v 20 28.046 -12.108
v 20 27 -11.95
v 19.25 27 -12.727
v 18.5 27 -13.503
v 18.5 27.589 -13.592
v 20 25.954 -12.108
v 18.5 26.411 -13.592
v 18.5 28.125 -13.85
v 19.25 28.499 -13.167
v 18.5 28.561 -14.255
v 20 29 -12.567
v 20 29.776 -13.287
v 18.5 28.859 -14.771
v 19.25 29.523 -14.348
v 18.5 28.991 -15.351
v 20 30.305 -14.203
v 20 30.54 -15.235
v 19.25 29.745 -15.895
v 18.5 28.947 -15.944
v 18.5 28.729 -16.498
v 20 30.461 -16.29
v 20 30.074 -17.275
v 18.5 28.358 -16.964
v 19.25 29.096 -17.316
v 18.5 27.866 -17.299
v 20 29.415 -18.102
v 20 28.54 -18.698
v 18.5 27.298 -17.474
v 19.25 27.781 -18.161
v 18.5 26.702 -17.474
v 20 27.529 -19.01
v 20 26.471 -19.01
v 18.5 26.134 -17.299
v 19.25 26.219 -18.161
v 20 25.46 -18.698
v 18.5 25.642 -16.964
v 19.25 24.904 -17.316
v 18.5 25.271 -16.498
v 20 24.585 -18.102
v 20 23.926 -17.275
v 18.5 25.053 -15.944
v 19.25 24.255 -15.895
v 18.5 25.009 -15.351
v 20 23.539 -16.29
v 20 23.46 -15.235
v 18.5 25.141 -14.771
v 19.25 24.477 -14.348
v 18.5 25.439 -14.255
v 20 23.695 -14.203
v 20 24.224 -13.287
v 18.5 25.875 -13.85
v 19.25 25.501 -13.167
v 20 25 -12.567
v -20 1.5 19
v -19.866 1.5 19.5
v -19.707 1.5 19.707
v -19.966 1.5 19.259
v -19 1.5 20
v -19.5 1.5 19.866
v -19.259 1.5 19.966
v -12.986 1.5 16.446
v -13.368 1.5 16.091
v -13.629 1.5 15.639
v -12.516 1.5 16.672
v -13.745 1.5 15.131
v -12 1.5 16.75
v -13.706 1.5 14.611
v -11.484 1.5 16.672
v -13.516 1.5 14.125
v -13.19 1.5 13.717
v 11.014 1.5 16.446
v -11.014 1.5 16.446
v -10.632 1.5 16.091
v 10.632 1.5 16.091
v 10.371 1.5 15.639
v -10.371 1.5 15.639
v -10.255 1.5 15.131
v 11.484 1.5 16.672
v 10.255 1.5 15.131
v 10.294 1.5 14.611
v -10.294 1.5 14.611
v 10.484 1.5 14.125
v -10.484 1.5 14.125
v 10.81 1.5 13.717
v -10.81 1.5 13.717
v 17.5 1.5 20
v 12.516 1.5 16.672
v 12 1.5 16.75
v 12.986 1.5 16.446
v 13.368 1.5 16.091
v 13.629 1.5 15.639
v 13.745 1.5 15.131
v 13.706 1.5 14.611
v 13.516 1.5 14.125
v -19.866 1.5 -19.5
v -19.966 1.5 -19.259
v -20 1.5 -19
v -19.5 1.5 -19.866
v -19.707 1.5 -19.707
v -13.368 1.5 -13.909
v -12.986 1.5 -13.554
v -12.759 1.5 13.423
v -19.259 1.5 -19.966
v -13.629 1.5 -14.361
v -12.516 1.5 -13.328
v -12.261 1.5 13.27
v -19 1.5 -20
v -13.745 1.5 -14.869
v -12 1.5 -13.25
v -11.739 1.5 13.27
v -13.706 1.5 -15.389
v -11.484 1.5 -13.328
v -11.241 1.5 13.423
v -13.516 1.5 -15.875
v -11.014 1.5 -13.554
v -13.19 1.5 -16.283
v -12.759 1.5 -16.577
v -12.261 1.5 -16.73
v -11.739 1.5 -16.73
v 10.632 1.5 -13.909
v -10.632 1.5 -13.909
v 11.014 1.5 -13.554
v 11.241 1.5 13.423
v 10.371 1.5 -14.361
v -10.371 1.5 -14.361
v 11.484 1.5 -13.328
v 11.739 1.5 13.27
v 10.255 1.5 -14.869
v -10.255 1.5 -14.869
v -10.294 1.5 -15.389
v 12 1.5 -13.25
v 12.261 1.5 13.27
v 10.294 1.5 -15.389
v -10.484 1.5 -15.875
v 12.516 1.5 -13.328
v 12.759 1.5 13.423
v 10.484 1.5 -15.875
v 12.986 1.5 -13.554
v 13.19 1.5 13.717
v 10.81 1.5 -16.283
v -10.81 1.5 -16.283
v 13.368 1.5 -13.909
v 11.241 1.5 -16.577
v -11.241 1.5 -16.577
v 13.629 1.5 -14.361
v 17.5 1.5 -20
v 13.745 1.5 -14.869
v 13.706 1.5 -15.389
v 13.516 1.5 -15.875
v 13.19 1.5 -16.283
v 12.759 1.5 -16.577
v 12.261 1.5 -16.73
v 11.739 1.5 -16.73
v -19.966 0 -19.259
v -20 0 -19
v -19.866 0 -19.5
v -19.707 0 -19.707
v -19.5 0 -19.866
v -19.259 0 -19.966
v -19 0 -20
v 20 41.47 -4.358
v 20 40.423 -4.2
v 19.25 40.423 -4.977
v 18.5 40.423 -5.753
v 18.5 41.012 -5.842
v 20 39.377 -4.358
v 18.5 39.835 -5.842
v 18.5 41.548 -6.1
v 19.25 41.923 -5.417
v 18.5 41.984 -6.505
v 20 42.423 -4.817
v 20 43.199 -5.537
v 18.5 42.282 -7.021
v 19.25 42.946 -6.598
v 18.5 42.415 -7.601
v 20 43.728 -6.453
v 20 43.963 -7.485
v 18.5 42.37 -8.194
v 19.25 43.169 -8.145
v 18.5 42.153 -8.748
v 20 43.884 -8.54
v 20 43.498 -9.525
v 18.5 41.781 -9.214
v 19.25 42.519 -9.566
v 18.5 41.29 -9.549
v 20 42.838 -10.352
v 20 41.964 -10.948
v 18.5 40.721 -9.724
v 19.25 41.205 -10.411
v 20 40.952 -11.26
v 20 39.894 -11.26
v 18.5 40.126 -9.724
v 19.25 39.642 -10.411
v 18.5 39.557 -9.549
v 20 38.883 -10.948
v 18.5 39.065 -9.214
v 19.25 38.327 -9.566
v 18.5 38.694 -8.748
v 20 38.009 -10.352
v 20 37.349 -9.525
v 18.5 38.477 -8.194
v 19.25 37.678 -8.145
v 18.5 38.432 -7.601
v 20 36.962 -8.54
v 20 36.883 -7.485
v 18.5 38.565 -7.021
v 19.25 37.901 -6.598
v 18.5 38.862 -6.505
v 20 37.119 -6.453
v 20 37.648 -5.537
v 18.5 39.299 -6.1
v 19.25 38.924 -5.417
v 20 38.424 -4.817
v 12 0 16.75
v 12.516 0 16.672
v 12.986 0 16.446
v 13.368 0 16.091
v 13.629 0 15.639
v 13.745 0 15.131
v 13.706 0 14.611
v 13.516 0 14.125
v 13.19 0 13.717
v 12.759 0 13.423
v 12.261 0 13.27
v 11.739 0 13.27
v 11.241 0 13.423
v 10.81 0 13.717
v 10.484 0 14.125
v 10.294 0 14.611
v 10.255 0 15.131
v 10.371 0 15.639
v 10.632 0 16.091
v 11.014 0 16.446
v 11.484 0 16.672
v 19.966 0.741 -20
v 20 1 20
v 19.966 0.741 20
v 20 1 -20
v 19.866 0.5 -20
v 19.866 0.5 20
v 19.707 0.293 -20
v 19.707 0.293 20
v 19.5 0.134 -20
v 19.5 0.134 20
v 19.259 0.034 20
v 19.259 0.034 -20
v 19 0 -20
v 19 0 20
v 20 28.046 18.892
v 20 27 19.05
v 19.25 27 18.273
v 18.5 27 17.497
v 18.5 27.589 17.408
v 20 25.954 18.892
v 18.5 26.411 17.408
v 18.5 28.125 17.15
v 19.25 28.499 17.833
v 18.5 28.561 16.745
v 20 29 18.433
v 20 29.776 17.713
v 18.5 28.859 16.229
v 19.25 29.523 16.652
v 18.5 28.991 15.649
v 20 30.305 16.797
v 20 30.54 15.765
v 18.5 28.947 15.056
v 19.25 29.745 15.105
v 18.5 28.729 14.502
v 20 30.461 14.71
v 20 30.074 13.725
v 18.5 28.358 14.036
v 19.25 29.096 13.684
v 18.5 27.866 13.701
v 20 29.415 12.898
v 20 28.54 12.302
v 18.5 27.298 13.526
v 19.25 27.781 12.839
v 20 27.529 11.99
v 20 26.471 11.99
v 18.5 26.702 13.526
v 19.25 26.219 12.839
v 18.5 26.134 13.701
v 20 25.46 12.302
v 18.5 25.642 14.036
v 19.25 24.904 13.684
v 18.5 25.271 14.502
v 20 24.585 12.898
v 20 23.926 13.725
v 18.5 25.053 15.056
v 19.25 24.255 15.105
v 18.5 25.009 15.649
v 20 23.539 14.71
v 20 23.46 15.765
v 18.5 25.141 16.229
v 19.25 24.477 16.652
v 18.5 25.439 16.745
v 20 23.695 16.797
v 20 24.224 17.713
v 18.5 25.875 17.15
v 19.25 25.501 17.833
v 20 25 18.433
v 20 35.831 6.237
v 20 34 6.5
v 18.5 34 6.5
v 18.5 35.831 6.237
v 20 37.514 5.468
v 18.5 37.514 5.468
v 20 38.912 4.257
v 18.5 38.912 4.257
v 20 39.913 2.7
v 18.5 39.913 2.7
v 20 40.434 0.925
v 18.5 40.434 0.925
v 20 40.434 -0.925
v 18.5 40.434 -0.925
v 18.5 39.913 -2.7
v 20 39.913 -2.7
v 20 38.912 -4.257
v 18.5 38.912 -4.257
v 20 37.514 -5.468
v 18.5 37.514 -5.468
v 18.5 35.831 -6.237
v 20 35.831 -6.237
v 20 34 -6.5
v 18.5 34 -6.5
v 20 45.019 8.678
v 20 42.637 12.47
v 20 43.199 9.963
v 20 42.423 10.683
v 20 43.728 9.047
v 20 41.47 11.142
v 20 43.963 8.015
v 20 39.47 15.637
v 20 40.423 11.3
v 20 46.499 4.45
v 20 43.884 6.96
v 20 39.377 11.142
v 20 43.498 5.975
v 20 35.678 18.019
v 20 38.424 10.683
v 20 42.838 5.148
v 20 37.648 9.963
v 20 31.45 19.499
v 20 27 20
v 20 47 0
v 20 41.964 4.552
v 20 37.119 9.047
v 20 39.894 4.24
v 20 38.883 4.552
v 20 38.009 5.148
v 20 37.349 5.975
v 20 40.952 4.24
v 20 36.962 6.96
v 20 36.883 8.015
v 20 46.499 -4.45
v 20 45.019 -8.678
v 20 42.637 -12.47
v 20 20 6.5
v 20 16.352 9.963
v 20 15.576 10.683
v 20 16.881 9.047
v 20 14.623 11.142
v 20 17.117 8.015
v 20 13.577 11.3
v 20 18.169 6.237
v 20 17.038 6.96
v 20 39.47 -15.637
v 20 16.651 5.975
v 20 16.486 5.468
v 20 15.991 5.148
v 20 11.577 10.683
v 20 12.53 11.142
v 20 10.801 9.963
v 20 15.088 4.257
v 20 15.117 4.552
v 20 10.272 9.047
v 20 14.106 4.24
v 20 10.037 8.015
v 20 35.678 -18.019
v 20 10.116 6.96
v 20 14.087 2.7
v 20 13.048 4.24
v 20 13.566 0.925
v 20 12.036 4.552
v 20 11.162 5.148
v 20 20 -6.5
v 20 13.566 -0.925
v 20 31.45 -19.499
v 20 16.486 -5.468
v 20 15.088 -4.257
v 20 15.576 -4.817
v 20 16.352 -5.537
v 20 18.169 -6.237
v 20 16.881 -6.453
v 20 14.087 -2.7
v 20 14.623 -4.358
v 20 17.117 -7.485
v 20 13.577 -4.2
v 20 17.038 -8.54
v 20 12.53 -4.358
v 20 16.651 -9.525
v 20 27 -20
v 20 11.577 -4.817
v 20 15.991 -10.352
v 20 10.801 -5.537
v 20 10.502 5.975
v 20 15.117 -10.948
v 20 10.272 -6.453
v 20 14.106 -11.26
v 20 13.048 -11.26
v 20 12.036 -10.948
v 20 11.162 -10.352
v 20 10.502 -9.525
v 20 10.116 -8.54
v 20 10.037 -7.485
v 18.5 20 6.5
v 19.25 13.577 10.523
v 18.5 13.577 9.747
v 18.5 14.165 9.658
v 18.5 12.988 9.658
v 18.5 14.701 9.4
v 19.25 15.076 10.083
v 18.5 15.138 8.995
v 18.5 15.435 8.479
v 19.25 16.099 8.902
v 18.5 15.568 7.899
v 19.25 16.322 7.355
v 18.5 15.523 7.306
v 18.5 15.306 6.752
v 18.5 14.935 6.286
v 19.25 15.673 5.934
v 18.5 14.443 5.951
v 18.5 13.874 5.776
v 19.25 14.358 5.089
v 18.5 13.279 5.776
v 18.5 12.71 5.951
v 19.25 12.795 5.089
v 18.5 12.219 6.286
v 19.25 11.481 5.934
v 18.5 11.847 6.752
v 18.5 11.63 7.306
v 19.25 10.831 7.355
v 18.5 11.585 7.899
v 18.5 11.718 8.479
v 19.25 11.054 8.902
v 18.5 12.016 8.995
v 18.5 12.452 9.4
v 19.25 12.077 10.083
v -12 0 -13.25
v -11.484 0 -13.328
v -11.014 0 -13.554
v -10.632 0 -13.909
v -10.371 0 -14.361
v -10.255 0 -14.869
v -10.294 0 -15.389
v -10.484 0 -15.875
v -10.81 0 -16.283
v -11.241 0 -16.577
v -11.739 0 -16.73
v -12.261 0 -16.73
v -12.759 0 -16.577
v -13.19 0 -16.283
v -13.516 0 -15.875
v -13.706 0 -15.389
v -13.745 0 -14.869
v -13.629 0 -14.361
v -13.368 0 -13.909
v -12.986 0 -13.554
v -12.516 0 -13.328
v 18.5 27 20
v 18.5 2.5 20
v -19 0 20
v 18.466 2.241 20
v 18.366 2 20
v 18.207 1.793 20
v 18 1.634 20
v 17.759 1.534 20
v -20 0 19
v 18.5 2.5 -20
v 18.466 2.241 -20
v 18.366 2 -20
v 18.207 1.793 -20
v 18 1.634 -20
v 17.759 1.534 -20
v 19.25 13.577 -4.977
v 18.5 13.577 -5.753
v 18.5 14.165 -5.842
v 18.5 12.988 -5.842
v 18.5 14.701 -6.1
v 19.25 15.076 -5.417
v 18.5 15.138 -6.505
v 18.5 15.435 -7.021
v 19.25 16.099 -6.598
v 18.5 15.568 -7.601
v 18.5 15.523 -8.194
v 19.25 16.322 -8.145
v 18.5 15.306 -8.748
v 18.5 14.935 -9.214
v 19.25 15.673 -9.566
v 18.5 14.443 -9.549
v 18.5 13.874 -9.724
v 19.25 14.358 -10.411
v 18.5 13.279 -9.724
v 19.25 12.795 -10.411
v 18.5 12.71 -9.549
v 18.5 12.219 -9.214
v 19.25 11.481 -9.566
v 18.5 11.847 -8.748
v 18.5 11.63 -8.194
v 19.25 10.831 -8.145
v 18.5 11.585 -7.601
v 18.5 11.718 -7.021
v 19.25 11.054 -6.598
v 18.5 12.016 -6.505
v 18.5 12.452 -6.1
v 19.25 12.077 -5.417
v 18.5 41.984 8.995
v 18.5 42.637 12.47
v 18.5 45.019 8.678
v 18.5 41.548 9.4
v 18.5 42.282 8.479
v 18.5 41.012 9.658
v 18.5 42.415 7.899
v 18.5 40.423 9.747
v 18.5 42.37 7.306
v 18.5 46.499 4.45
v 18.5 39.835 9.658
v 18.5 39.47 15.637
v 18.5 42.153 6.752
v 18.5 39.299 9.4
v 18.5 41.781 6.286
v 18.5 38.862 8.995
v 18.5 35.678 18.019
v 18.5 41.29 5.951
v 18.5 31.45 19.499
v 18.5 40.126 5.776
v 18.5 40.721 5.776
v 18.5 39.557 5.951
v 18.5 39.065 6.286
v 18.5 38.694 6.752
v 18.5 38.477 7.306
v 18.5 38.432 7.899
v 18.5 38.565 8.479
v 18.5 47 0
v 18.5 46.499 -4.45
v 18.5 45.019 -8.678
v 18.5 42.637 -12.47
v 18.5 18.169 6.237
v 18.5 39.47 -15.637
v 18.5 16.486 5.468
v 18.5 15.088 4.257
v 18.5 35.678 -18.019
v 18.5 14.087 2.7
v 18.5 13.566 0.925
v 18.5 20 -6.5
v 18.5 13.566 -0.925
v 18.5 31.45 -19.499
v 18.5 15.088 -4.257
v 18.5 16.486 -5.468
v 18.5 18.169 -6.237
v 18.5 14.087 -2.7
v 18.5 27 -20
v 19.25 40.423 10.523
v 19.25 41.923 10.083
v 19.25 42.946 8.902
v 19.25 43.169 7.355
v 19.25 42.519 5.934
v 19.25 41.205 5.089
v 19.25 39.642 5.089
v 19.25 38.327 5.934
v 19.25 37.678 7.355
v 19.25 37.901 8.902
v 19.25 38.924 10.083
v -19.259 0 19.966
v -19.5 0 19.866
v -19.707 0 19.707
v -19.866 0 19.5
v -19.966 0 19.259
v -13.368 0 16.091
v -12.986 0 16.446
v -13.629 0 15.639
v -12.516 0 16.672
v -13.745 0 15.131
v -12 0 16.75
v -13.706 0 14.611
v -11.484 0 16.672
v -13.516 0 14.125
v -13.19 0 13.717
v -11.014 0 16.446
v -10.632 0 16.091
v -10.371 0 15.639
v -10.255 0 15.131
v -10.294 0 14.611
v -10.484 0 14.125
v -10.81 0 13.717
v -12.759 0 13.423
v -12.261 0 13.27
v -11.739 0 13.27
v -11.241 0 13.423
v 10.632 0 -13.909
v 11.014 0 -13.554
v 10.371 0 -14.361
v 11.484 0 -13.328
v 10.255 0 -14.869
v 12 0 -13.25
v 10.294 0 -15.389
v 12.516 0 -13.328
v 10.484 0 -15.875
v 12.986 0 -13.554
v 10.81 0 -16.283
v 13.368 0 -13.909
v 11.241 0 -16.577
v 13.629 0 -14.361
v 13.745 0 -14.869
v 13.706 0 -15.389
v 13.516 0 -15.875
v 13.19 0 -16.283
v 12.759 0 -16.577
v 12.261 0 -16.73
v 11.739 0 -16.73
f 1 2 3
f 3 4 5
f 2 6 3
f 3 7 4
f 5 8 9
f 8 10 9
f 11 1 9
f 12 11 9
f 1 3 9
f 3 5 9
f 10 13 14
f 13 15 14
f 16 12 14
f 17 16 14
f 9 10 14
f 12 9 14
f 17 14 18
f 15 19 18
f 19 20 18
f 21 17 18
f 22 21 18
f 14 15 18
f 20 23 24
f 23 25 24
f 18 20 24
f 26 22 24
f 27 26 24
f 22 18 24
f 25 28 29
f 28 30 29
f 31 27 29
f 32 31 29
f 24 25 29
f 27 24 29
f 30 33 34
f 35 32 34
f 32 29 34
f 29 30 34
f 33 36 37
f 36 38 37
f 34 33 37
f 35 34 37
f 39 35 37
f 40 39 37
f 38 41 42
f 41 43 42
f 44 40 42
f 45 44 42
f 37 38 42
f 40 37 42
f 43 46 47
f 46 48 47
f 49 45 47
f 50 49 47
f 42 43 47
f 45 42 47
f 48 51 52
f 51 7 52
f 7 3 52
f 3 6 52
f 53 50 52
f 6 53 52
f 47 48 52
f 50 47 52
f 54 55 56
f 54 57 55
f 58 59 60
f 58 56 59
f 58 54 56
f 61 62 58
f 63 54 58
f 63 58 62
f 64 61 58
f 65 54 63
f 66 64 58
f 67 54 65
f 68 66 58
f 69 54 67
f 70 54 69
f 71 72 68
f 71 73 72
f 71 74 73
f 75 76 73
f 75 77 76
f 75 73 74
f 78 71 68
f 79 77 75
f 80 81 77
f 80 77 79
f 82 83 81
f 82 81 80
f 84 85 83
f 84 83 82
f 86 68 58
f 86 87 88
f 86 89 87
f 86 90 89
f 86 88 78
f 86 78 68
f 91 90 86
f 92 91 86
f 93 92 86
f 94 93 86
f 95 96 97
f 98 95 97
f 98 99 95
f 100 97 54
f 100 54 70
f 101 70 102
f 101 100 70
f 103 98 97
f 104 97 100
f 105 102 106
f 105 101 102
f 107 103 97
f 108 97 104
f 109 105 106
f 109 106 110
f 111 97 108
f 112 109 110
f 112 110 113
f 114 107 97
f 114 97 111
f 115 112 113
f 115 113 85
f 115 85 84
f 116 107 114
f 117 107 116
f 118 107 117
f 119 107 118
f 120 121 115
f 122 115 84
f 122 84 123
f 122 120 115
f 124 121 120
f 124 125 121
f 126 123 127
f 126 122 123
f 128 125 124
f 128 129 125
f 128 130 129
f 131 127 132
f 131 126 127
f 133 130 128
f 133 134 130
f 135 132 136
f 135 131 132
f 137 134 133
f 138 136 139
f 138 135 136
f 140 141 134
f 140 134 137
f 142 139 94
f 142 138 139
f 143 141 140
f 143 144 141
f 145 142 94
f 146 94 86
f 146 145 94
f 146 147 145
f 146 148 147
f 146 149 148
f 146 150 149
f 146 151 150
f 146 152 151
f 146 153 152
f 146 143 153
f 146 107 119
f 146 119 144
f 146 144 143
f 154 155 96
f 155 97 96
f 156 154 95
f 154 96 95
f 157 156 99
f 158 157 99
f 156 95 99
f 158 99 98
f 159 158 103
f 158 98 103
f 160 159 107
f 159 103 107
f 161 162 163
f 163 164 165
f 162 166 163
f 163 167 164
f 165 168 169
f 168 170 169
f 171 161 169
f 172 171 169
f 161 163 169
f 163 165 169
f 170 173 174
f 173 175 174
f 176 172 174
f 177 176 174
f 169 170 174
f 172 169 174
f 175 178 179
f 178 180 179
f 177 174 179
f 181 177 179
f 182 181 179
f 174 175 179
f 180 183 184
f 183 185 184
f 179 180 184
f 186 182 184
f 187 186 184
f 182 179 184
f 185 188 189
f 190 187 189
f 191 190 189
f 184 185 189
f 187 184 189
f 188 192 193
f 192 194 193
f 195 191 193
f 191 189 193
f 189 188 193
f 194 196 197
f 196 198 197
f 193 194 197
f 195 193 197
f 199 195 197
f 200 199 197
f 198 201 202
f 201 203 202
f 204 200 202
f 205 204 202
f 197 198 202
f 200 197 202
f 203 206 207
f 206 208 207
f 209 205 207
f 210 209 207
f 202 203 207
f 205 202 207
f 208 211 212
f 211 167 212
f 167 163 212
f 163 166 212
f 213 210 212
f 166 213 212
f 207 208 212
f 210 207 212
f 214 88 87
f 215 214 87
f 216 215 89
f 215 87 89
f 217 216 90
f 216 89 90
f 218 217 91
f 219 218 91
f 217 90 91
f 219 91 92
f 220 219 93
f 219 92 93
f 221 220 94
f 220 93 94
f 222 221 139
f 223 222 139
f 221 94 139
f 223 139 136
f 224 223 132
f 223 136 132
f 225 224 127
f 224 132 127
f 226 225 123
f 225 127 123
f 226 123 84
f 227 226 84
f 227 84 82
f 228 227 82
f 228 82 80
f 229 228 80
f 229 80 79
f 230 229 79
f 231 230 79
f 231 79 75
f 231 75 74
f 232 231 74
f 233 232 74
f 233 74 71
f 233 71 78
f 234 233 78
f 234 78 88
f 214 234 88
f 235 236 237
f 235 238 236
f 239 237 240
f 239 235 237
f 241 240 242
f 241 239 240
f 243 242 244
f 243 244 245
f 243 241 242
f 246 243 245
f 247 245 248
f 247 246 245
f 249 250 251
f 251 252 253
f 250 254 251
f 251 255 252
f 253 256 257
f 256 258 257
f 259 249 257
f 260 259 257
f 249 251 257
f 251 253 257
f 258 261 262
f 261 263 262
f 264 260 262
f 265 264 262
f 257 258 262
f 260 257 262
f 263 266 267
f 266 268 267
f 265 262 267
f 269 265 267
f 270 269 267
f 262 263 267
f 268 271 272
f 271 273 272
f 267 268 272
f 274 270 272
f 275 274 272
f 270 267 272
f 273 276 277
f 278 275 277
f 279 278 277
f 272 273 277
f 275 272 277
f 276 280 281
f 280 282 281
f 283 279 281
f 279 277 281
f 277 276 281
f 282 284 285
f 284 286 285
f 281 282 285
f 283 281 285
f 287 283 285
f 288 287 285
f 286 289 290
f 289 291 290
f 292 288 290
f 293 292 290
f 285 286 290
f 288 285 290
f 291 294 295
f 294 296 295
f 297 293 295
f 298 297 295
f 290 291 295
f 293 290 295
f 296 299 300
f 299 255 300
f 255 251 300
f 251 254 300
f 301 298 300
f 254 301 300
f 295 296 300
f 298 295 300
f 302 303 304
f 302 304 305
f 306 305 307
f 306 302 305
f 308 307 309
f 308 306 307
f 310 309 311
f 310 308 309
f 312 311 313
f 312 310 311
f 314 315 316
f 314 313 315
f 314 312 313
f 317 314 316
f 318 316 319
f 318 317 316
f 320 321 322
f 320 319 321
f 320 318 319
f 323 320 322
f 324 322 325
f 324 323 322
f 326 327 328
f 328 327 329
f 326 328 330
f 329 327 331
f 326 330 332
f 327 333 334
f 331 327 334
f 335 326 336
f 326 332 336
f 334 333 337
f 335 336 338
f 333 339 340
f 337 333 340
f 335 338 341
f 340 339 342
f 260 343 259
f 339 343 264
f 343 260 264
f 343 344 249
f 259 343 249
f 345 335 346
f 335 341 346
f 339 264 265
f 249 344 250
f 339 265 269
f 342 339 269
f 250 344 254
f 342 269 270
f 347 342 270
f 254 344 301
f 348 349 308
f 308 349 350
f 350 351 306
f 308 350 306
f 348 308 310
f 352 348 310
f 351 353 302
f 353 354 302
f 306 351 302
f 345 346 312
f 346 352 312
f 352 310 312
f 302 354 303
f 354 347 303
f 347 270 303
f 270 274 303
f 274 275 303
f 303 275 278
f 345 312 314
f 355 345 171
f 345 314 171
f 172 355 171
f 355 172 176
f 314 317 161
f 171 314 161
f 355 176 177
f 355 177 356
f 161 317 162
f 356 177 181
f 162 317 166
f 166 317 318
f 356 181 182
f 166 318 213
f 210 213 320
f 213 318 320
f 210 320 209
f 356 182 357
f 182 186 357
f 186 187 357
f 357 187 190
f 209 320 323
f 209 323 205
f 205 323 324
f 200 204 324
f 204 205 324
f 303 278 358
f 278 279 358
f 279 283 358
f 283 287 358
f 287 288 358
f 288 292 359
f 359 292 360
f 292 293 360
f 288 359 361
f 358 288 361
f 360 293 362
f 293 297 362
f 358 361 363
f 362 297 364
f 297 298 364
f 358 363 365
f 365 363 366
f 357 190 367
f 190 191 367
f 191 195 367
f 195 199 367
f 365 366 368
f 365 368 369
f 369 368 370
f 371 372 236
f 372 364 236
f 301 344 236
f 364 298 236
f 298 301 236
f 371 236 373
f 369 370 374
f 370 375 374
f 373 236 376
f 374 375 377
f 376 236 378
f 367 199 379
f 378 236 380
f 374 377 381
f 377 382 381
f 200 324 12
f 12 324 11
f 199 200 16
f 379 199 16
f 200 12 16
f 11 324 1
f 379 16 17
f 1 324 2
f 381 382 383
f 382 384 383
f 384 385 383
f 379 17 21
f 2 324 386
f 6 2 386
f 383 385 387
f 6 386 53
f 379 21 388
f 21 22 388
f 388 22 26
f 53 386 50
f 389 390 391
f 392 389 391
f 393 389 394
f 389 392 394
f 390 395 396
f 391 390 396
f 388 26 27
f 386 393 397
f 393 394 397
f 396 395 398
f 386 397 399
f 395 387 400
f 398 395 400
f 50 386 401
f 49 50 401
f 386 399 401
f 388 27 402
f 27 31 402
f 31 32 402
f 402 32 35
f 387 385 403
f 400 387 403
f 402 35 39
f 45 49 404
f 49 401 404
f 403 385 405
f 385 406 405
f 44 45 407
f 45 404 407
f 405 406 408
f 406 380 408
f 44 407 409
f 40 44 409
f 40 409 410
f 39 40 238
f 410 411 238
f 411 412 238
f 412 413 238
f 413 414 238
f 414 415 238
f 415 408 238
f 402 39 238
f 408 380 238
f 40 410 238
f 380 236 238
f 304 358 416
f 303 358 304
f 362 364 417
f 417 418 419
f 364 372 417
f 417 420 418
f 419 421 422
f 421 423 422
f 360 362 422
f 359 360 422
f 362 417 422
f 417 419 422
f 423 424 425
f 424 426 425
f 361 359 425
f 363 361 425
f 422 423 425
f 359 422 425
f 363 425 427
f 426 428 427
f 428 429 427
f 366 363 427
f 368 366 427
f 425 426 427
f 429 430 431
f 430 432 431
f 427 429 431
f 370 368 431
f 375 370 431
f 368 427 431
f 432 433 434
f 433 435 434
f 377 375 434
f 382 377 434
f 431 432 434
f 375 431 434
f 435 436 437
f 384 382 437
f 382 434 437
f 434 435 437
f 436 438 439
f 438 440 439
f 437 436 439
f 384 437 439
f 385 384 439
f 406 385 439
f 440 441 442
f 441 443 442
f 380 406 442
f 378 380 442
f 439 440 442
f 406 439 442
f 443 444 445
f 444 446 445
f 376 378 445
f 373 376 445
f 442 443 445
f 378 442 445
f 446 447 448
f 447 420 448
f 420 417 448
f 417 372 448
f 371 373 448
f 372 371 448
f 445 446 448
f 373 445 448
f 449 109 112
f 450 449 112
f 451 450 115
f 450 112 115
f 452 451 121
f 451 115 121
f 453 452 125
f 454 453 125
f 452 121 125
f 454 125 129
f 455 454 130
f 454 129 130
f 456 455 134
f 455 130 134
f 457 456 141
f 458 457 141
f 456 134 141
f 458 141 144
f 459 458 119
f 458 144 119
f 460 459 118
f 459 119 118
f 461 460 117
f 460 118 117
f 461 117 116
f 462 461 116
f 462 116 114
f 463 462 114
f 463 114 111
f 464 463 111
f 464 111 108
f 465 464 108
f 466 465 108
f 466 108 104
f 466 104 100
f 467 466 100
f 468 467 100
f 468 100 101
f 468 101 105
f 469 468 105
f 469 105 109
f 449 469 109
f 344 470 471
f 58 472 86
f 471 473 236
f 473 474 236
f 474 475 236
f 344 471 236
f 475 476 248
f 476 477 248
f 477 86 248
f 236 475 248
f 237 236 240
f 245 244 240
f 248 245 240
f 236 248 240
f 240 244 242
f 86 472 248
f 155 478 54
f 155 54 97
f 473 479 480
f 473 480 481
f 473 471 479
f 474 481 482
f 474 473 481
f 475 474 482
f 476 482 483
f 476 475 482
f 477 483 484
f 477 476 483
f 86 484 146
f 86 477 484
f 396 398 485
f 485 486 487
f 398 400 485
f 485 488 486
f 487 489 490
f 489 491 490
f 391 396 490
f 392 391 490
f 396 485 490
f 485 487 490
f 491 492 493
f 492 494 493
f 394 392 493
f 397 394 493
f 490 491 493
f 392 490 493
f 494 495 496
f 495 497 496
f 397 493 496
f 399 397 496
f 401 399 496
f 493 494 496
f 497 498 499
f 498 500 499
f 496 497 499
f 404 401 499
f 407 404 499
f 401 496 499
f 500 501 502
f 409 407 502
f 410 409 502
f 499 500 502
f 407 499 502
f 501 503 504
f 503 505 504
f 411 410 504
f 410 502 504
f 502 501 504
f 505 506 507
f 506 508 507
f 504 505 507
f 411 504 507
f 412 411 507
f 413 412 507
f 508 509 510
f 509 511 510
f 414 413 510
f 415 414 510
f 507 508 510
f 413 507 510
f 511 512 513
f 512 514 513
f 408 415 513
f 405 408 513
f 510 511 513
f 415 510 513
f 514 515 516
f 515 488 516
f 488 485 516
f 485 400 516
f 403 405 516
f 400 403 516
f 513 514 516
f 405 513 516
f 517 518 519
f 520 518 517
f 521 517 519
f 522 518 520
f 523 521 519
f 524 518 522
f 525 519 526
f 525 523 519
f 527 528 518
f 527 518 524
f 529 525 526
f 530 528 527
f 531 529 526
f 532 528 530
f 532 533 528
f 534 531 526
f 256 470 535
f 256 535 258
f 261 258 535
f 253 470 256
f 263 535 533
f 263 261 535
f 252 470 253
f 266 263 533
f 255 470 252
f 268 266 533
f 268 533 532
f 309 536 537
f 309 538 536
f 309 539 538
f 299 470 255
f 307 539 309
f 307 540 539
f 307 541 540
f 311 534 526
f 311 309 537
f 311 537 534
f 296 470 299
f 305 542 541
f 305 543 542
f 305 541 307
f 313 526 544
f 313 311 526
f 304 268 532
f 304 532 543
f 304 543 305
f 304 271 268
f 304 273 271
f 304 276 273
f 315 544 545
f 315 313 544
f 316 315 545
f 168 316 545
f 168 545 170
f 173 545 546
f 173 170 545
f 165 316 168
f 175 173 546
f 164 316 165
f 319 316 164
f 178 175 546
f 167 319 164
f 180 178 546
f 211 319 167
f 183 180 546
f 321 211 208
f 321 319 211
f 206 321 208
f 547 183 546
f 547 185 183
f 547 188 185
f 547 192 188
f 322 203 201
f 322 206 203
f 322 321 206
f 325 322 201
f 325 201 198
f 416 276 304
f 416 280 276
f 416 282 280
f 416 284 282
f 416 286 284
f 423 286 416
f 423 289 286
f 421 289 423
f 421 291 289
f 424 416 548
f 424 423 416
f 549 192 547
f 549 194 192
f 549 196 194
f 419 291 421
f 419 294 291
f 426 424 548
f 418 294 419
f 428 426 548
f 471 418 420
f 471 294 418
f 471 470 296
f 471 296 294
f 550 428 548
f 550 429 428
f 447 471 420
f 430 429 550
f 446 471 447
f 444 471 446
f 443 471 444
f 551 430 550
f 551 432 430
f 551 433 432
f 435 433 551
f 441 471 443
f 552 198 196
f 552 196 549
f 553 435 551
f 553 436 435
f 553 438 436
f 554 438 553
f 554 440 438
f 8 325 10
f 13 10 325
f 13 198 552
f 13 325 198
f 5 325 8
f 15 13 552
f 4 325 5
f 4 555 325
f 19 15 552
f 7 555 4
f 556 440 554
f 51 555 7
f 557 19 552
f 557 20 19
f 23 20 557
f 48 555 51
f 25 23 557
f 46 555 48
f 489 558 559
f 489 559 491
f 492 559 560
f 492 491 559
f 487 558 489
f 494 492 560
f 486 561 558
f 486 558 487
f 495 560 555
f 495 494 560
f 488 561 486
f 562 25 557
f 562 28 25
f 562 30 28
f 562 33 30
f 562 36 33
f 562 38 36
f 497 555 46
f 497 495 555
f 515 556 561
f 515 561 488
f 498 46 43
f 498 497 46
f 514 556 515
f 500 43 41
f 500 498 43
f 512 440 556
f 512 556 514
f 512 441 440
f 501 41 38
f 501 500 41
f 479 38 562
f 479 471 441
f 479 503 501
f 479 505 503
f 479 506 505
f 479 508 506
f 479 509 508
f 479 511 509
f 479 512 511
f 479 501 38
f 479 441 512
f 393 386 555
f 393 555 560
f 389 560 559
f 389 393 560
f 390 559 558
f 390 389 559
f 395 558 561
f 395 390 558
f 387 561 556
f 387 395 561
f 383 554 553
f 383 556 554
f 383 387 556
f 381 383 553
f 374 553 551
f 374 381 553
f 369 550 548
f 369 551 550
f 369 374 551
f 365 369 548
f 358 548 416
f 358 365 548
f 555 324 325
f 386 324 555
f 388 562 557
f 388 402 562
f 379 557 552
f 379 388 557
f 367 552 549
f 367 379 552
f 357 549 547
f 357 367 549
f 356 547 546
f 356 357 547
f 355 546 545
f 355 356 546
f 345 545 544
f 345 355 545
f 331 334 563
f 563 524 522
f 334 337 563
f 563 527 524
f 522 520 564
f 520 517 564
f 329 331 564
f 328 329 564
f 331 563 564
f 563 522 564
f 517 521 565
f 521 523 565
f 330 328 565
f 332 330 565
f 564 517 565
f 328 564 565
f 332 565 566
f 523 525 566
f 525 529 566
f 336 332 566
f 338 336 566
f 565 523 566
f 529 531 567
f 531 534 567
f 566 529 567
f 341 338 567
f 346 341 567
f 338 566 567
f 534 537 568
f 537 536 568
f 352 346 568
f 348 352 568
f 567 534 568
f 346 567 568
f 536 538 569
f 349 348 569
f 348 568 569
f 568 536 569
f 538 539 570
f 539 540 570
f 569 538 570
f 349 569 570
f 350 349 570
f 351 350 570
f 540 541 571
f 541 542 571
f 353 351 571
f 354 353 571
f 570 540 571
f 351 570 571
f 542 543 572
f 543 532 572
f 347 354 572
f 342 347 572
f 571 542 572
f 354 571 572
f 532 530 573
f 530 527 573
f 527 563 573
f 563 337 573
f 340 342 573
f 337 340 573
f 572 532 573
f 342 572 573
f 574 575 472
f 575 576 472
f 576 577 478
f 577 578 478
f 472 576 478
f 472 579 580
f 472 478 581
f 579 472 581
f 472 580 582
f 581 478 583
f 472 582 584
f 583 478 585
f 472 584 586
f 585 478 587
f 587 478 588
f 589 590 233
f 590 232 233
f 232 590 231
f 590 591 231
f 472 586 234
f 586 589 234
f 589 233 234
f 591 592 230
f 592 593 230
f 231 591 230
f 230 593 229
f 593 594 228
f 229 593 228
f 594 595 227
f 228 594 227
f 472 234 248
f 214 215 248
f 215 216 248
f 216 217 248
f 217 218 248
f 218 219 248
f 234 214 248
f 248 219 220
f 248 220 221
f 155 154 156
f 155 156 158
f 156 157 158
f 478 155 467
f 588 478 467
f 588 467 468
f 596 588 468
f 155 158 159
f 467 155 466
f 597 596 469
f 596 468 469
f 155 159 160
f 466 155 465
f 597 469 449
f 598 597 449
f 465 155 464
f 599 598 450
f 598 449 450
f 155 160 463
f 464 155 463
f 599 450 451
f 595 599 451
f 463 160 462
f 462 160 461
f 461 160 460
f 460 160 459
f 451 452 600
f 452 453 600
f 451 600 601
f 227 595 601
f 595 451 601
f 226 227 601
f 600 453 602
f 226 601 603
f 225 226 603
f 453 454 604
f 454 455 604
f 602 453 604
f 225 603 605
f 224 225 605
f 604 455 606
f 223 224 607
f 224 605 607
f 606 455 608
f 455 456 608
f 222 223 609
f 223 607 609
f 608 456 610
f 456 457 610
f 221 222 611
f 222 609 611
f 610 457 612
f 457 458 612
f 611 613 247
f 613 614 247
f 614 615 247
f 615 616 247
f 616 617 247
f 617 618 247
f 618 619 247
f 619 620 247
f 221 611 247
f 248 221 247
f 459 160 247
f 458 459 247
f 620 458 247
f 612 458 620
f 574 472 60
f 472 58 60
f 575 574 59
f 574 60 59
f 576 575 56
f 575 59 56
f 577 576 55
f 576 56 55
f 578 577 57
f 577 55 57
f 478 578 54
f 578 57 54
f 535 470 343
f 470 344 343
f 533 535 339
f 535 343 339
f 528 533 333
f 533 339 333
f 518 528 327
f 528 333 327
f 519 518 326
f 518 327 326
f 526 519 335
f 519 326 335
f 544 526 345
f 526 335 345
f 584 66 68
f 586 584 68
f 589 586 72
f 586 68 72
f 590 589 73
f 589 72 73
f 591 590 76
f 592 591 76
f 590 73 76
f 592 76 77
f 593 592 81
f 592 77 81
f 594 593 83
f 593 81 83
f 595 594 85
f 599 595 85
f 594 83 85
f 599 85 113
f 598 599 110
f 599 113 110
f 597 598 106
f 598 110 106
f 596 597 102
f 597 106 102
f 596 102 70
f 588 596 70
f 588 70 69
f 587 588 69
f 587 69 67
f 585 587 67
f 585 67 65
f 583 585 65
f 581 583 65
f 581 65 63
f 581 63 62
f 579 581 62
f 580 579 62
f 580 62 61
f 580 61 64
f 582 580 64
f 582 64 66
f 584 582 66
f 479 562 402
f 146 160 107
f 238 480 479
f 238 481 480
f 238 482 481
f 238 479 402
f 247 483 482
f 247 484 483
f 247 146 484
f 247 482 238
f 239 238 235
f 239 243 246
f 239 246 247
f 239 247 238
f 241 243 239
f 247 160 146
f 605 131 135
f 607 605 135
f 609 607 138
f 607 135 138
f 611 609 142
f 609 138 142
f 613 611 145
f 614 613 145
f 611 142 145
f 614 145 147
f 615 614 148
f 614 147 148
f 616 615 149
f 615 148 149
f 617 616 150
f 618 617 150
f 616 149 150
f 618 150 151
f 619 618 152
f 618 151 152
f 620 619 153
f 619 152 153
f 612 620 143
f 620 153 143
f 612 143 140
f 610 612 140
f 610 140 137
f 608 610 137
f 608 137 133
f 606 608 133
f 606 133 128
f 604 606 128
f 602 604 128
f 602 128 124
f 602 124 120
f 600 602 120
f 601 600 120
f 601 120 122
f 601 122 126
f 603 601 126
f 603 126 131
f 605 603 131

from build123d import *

# Parameters (mm, degrees)
SKETCH_1_W                   = 40
SKETCH_1_H                   = 40
EXTRUDE_1_DEPTH              = 1.5
SKETCH_2_R                   = 1.75
CUT_EXTRUDE_1_DEPTH          = 29.324018077
EXTRUDE_START                = -1.5
SKETCH_3_W                   = 1.5
SKETCH_3_H                   = 40
EXTRUDE_2_DEPTH              = 47
SKETCH_4_R                   = 1.5
CUT_EXTRUDE_2_DEPTH          = 65.876806333
HOLE_WIZARD_M3_1_D           = 3.4
HOLE_WIZARD_M3_1_DEPTH       = 15
HOLE_WIZARD_M3_1_CSINK_D     = 7.1
HOLE_WIZARD_M3_1_CSINK_ANGLE = 92
HOLE_WIZARD_M3_1_TIP         = 1.021463052
FILLET_1_R                   = 20
FILLET_2_R                   = 1


with BuildPart() as part:
    # 스케치1 → 보스-돌출1 (new body)
    with BuildSketch(Plane(origin=(0, 0, 0), x_dir=(1, 0, 0), z_dir=(0, 1, 0))):
        Rectangle(SKETCH_1_W, SKETCH_1_H)
    extrude(amount=EXTRUDE_1_DEPTH)

    # 스케치2 → 컷-돌출1 (cut, through all)
    with BuildSketch(Plane(origin=(0, 1.5, 0), x_dir=(1, 0, 0), z_dir=(0, 1, 0))):
        with Locations(Location((-12, 15, 0), (0, 0, 270))):
            Circle(SKETCH_2_R)
        with Locations(Location((12, 15, 0), (0, 0, 270))):
            Circle(SKETCH_2_R)
        with Locations(Location((-12, -15, 0), (0, 0, 270))):
            Circle(SKETCH_2_R)
        with Locations(Location((12, -15, 0), (0, 0, 270))):
            Circle(SKETCH_2_R)
    extrude(amount=-CUT_EXTRUDE_1_DEPTH, mode=Mode.SUBTRACT)

    # 스케치3 → 보스-돌출2 (add)
    with BuildSketch(Plane(origin=(0, 1.5, 0), x_dir=(1, 0, 0), z_dir=(0, 1, 0)).offset(EXTRUDE_START)):
        with Locations((19.25, 0)):
            Rectangle(SKETCH_3_W, SKETCH_3_H)
    extrude(amount=EXTRUDE_2_DEPTH)

    # 스케치4 → 컷-돌출2 (cut, through all)
    with BuildSketch(Plane(origin=(20, 0, 0), x_dir=(0, 0, -1), z_dir=(1, 0, 0))):
        with Locations((15.5, 27)):
            Circle(SKETCH_4_R)
        with Locations((7.75, 13.576606241)):
            Circle(SKETCH_4_R)
        with Locations((-7.75, 13.576606241)):
            Circle(SKETCH_4_R)
        with Locations((-15.5, 27)):
            Circle(SKETCH_4_R)
        with Locations((-7.75, 40.423393759)):
            Circle(SKETCH_4_R)
        with Locations((7.75, 40.423393759)):
            Circle(SKETCH_4_R)
        with BuildLine():
            Line((-6.5, 20), (-6.5, 34))
            ThreePointArc((-6.5, 34), (0, 40.5), (6.5, 34))
            Line((6.5, 34), (6.5, 20))
            ThreePointArc((6.5, 20), (0, 13.5), (-6.5, 20))
        make_face()
    extrude(amount=-CUT_EXTRUDE_2_DEPTH, mode=Mode.SUBTRACT)

    # M3 둥근 십자머리 나사용 카운터싱크1
    with Locations(Plane(origin=(20, 0, 0), x_dir=(0, 0, -1), z_dir=(1, 0, 0))):
        with Locations((15.5, 27), (7.75, 40.423393759), (-7.75, 40.423393759), (-15.5, 27), (-7.75, 13.576606241), (7.75, 13.576606241)):
            CounterSinkHole(HOLE_WIZARD_M3_1_D / 2, HOLE_WIZARD_M3_1_CSINK_D / 2, depth=HOLE_WIZARD_M3_1_DEPTH, counter_sink_angle=HOLE_WIZARD_M3_1_CSINK_ANGLE)
            with Locations((0, 0, -(HOLE_WIZARD_M3_1_DEPTH + HOLE_WIZARD_M3_1_TIP / 2))):  # 118° drill point
                Cone(0, HOLE_WIZARD_M3_1_D / 2, HOLE_WIZARD_M3_1_TIP, mode=Mode.SUBTRACT)

    # 필렛1
    fillet_1_edges = [part.edges().sort_by_distance(p)[0] for p in [
        (19.25, 47, -20),
        (19.25, 47, 20),
    ]]
    fillet(fillet_1_edges, radius=FILLET_1_R - 0.0001)  # a hair under: the kernel refuses the full size

    # 필렛2
    fillet_2_edges = [part.edges().sort_by_distance(p)[0] for p in [
        (18.5, 1.5, 0),
        (20, 0, 0),
        (-20, 0.75, 20),
        (-20, 0.75, -20),
    ]]
    fillet(fillet_2_edges, radius=FILLET_2_R)


solid = part.part
